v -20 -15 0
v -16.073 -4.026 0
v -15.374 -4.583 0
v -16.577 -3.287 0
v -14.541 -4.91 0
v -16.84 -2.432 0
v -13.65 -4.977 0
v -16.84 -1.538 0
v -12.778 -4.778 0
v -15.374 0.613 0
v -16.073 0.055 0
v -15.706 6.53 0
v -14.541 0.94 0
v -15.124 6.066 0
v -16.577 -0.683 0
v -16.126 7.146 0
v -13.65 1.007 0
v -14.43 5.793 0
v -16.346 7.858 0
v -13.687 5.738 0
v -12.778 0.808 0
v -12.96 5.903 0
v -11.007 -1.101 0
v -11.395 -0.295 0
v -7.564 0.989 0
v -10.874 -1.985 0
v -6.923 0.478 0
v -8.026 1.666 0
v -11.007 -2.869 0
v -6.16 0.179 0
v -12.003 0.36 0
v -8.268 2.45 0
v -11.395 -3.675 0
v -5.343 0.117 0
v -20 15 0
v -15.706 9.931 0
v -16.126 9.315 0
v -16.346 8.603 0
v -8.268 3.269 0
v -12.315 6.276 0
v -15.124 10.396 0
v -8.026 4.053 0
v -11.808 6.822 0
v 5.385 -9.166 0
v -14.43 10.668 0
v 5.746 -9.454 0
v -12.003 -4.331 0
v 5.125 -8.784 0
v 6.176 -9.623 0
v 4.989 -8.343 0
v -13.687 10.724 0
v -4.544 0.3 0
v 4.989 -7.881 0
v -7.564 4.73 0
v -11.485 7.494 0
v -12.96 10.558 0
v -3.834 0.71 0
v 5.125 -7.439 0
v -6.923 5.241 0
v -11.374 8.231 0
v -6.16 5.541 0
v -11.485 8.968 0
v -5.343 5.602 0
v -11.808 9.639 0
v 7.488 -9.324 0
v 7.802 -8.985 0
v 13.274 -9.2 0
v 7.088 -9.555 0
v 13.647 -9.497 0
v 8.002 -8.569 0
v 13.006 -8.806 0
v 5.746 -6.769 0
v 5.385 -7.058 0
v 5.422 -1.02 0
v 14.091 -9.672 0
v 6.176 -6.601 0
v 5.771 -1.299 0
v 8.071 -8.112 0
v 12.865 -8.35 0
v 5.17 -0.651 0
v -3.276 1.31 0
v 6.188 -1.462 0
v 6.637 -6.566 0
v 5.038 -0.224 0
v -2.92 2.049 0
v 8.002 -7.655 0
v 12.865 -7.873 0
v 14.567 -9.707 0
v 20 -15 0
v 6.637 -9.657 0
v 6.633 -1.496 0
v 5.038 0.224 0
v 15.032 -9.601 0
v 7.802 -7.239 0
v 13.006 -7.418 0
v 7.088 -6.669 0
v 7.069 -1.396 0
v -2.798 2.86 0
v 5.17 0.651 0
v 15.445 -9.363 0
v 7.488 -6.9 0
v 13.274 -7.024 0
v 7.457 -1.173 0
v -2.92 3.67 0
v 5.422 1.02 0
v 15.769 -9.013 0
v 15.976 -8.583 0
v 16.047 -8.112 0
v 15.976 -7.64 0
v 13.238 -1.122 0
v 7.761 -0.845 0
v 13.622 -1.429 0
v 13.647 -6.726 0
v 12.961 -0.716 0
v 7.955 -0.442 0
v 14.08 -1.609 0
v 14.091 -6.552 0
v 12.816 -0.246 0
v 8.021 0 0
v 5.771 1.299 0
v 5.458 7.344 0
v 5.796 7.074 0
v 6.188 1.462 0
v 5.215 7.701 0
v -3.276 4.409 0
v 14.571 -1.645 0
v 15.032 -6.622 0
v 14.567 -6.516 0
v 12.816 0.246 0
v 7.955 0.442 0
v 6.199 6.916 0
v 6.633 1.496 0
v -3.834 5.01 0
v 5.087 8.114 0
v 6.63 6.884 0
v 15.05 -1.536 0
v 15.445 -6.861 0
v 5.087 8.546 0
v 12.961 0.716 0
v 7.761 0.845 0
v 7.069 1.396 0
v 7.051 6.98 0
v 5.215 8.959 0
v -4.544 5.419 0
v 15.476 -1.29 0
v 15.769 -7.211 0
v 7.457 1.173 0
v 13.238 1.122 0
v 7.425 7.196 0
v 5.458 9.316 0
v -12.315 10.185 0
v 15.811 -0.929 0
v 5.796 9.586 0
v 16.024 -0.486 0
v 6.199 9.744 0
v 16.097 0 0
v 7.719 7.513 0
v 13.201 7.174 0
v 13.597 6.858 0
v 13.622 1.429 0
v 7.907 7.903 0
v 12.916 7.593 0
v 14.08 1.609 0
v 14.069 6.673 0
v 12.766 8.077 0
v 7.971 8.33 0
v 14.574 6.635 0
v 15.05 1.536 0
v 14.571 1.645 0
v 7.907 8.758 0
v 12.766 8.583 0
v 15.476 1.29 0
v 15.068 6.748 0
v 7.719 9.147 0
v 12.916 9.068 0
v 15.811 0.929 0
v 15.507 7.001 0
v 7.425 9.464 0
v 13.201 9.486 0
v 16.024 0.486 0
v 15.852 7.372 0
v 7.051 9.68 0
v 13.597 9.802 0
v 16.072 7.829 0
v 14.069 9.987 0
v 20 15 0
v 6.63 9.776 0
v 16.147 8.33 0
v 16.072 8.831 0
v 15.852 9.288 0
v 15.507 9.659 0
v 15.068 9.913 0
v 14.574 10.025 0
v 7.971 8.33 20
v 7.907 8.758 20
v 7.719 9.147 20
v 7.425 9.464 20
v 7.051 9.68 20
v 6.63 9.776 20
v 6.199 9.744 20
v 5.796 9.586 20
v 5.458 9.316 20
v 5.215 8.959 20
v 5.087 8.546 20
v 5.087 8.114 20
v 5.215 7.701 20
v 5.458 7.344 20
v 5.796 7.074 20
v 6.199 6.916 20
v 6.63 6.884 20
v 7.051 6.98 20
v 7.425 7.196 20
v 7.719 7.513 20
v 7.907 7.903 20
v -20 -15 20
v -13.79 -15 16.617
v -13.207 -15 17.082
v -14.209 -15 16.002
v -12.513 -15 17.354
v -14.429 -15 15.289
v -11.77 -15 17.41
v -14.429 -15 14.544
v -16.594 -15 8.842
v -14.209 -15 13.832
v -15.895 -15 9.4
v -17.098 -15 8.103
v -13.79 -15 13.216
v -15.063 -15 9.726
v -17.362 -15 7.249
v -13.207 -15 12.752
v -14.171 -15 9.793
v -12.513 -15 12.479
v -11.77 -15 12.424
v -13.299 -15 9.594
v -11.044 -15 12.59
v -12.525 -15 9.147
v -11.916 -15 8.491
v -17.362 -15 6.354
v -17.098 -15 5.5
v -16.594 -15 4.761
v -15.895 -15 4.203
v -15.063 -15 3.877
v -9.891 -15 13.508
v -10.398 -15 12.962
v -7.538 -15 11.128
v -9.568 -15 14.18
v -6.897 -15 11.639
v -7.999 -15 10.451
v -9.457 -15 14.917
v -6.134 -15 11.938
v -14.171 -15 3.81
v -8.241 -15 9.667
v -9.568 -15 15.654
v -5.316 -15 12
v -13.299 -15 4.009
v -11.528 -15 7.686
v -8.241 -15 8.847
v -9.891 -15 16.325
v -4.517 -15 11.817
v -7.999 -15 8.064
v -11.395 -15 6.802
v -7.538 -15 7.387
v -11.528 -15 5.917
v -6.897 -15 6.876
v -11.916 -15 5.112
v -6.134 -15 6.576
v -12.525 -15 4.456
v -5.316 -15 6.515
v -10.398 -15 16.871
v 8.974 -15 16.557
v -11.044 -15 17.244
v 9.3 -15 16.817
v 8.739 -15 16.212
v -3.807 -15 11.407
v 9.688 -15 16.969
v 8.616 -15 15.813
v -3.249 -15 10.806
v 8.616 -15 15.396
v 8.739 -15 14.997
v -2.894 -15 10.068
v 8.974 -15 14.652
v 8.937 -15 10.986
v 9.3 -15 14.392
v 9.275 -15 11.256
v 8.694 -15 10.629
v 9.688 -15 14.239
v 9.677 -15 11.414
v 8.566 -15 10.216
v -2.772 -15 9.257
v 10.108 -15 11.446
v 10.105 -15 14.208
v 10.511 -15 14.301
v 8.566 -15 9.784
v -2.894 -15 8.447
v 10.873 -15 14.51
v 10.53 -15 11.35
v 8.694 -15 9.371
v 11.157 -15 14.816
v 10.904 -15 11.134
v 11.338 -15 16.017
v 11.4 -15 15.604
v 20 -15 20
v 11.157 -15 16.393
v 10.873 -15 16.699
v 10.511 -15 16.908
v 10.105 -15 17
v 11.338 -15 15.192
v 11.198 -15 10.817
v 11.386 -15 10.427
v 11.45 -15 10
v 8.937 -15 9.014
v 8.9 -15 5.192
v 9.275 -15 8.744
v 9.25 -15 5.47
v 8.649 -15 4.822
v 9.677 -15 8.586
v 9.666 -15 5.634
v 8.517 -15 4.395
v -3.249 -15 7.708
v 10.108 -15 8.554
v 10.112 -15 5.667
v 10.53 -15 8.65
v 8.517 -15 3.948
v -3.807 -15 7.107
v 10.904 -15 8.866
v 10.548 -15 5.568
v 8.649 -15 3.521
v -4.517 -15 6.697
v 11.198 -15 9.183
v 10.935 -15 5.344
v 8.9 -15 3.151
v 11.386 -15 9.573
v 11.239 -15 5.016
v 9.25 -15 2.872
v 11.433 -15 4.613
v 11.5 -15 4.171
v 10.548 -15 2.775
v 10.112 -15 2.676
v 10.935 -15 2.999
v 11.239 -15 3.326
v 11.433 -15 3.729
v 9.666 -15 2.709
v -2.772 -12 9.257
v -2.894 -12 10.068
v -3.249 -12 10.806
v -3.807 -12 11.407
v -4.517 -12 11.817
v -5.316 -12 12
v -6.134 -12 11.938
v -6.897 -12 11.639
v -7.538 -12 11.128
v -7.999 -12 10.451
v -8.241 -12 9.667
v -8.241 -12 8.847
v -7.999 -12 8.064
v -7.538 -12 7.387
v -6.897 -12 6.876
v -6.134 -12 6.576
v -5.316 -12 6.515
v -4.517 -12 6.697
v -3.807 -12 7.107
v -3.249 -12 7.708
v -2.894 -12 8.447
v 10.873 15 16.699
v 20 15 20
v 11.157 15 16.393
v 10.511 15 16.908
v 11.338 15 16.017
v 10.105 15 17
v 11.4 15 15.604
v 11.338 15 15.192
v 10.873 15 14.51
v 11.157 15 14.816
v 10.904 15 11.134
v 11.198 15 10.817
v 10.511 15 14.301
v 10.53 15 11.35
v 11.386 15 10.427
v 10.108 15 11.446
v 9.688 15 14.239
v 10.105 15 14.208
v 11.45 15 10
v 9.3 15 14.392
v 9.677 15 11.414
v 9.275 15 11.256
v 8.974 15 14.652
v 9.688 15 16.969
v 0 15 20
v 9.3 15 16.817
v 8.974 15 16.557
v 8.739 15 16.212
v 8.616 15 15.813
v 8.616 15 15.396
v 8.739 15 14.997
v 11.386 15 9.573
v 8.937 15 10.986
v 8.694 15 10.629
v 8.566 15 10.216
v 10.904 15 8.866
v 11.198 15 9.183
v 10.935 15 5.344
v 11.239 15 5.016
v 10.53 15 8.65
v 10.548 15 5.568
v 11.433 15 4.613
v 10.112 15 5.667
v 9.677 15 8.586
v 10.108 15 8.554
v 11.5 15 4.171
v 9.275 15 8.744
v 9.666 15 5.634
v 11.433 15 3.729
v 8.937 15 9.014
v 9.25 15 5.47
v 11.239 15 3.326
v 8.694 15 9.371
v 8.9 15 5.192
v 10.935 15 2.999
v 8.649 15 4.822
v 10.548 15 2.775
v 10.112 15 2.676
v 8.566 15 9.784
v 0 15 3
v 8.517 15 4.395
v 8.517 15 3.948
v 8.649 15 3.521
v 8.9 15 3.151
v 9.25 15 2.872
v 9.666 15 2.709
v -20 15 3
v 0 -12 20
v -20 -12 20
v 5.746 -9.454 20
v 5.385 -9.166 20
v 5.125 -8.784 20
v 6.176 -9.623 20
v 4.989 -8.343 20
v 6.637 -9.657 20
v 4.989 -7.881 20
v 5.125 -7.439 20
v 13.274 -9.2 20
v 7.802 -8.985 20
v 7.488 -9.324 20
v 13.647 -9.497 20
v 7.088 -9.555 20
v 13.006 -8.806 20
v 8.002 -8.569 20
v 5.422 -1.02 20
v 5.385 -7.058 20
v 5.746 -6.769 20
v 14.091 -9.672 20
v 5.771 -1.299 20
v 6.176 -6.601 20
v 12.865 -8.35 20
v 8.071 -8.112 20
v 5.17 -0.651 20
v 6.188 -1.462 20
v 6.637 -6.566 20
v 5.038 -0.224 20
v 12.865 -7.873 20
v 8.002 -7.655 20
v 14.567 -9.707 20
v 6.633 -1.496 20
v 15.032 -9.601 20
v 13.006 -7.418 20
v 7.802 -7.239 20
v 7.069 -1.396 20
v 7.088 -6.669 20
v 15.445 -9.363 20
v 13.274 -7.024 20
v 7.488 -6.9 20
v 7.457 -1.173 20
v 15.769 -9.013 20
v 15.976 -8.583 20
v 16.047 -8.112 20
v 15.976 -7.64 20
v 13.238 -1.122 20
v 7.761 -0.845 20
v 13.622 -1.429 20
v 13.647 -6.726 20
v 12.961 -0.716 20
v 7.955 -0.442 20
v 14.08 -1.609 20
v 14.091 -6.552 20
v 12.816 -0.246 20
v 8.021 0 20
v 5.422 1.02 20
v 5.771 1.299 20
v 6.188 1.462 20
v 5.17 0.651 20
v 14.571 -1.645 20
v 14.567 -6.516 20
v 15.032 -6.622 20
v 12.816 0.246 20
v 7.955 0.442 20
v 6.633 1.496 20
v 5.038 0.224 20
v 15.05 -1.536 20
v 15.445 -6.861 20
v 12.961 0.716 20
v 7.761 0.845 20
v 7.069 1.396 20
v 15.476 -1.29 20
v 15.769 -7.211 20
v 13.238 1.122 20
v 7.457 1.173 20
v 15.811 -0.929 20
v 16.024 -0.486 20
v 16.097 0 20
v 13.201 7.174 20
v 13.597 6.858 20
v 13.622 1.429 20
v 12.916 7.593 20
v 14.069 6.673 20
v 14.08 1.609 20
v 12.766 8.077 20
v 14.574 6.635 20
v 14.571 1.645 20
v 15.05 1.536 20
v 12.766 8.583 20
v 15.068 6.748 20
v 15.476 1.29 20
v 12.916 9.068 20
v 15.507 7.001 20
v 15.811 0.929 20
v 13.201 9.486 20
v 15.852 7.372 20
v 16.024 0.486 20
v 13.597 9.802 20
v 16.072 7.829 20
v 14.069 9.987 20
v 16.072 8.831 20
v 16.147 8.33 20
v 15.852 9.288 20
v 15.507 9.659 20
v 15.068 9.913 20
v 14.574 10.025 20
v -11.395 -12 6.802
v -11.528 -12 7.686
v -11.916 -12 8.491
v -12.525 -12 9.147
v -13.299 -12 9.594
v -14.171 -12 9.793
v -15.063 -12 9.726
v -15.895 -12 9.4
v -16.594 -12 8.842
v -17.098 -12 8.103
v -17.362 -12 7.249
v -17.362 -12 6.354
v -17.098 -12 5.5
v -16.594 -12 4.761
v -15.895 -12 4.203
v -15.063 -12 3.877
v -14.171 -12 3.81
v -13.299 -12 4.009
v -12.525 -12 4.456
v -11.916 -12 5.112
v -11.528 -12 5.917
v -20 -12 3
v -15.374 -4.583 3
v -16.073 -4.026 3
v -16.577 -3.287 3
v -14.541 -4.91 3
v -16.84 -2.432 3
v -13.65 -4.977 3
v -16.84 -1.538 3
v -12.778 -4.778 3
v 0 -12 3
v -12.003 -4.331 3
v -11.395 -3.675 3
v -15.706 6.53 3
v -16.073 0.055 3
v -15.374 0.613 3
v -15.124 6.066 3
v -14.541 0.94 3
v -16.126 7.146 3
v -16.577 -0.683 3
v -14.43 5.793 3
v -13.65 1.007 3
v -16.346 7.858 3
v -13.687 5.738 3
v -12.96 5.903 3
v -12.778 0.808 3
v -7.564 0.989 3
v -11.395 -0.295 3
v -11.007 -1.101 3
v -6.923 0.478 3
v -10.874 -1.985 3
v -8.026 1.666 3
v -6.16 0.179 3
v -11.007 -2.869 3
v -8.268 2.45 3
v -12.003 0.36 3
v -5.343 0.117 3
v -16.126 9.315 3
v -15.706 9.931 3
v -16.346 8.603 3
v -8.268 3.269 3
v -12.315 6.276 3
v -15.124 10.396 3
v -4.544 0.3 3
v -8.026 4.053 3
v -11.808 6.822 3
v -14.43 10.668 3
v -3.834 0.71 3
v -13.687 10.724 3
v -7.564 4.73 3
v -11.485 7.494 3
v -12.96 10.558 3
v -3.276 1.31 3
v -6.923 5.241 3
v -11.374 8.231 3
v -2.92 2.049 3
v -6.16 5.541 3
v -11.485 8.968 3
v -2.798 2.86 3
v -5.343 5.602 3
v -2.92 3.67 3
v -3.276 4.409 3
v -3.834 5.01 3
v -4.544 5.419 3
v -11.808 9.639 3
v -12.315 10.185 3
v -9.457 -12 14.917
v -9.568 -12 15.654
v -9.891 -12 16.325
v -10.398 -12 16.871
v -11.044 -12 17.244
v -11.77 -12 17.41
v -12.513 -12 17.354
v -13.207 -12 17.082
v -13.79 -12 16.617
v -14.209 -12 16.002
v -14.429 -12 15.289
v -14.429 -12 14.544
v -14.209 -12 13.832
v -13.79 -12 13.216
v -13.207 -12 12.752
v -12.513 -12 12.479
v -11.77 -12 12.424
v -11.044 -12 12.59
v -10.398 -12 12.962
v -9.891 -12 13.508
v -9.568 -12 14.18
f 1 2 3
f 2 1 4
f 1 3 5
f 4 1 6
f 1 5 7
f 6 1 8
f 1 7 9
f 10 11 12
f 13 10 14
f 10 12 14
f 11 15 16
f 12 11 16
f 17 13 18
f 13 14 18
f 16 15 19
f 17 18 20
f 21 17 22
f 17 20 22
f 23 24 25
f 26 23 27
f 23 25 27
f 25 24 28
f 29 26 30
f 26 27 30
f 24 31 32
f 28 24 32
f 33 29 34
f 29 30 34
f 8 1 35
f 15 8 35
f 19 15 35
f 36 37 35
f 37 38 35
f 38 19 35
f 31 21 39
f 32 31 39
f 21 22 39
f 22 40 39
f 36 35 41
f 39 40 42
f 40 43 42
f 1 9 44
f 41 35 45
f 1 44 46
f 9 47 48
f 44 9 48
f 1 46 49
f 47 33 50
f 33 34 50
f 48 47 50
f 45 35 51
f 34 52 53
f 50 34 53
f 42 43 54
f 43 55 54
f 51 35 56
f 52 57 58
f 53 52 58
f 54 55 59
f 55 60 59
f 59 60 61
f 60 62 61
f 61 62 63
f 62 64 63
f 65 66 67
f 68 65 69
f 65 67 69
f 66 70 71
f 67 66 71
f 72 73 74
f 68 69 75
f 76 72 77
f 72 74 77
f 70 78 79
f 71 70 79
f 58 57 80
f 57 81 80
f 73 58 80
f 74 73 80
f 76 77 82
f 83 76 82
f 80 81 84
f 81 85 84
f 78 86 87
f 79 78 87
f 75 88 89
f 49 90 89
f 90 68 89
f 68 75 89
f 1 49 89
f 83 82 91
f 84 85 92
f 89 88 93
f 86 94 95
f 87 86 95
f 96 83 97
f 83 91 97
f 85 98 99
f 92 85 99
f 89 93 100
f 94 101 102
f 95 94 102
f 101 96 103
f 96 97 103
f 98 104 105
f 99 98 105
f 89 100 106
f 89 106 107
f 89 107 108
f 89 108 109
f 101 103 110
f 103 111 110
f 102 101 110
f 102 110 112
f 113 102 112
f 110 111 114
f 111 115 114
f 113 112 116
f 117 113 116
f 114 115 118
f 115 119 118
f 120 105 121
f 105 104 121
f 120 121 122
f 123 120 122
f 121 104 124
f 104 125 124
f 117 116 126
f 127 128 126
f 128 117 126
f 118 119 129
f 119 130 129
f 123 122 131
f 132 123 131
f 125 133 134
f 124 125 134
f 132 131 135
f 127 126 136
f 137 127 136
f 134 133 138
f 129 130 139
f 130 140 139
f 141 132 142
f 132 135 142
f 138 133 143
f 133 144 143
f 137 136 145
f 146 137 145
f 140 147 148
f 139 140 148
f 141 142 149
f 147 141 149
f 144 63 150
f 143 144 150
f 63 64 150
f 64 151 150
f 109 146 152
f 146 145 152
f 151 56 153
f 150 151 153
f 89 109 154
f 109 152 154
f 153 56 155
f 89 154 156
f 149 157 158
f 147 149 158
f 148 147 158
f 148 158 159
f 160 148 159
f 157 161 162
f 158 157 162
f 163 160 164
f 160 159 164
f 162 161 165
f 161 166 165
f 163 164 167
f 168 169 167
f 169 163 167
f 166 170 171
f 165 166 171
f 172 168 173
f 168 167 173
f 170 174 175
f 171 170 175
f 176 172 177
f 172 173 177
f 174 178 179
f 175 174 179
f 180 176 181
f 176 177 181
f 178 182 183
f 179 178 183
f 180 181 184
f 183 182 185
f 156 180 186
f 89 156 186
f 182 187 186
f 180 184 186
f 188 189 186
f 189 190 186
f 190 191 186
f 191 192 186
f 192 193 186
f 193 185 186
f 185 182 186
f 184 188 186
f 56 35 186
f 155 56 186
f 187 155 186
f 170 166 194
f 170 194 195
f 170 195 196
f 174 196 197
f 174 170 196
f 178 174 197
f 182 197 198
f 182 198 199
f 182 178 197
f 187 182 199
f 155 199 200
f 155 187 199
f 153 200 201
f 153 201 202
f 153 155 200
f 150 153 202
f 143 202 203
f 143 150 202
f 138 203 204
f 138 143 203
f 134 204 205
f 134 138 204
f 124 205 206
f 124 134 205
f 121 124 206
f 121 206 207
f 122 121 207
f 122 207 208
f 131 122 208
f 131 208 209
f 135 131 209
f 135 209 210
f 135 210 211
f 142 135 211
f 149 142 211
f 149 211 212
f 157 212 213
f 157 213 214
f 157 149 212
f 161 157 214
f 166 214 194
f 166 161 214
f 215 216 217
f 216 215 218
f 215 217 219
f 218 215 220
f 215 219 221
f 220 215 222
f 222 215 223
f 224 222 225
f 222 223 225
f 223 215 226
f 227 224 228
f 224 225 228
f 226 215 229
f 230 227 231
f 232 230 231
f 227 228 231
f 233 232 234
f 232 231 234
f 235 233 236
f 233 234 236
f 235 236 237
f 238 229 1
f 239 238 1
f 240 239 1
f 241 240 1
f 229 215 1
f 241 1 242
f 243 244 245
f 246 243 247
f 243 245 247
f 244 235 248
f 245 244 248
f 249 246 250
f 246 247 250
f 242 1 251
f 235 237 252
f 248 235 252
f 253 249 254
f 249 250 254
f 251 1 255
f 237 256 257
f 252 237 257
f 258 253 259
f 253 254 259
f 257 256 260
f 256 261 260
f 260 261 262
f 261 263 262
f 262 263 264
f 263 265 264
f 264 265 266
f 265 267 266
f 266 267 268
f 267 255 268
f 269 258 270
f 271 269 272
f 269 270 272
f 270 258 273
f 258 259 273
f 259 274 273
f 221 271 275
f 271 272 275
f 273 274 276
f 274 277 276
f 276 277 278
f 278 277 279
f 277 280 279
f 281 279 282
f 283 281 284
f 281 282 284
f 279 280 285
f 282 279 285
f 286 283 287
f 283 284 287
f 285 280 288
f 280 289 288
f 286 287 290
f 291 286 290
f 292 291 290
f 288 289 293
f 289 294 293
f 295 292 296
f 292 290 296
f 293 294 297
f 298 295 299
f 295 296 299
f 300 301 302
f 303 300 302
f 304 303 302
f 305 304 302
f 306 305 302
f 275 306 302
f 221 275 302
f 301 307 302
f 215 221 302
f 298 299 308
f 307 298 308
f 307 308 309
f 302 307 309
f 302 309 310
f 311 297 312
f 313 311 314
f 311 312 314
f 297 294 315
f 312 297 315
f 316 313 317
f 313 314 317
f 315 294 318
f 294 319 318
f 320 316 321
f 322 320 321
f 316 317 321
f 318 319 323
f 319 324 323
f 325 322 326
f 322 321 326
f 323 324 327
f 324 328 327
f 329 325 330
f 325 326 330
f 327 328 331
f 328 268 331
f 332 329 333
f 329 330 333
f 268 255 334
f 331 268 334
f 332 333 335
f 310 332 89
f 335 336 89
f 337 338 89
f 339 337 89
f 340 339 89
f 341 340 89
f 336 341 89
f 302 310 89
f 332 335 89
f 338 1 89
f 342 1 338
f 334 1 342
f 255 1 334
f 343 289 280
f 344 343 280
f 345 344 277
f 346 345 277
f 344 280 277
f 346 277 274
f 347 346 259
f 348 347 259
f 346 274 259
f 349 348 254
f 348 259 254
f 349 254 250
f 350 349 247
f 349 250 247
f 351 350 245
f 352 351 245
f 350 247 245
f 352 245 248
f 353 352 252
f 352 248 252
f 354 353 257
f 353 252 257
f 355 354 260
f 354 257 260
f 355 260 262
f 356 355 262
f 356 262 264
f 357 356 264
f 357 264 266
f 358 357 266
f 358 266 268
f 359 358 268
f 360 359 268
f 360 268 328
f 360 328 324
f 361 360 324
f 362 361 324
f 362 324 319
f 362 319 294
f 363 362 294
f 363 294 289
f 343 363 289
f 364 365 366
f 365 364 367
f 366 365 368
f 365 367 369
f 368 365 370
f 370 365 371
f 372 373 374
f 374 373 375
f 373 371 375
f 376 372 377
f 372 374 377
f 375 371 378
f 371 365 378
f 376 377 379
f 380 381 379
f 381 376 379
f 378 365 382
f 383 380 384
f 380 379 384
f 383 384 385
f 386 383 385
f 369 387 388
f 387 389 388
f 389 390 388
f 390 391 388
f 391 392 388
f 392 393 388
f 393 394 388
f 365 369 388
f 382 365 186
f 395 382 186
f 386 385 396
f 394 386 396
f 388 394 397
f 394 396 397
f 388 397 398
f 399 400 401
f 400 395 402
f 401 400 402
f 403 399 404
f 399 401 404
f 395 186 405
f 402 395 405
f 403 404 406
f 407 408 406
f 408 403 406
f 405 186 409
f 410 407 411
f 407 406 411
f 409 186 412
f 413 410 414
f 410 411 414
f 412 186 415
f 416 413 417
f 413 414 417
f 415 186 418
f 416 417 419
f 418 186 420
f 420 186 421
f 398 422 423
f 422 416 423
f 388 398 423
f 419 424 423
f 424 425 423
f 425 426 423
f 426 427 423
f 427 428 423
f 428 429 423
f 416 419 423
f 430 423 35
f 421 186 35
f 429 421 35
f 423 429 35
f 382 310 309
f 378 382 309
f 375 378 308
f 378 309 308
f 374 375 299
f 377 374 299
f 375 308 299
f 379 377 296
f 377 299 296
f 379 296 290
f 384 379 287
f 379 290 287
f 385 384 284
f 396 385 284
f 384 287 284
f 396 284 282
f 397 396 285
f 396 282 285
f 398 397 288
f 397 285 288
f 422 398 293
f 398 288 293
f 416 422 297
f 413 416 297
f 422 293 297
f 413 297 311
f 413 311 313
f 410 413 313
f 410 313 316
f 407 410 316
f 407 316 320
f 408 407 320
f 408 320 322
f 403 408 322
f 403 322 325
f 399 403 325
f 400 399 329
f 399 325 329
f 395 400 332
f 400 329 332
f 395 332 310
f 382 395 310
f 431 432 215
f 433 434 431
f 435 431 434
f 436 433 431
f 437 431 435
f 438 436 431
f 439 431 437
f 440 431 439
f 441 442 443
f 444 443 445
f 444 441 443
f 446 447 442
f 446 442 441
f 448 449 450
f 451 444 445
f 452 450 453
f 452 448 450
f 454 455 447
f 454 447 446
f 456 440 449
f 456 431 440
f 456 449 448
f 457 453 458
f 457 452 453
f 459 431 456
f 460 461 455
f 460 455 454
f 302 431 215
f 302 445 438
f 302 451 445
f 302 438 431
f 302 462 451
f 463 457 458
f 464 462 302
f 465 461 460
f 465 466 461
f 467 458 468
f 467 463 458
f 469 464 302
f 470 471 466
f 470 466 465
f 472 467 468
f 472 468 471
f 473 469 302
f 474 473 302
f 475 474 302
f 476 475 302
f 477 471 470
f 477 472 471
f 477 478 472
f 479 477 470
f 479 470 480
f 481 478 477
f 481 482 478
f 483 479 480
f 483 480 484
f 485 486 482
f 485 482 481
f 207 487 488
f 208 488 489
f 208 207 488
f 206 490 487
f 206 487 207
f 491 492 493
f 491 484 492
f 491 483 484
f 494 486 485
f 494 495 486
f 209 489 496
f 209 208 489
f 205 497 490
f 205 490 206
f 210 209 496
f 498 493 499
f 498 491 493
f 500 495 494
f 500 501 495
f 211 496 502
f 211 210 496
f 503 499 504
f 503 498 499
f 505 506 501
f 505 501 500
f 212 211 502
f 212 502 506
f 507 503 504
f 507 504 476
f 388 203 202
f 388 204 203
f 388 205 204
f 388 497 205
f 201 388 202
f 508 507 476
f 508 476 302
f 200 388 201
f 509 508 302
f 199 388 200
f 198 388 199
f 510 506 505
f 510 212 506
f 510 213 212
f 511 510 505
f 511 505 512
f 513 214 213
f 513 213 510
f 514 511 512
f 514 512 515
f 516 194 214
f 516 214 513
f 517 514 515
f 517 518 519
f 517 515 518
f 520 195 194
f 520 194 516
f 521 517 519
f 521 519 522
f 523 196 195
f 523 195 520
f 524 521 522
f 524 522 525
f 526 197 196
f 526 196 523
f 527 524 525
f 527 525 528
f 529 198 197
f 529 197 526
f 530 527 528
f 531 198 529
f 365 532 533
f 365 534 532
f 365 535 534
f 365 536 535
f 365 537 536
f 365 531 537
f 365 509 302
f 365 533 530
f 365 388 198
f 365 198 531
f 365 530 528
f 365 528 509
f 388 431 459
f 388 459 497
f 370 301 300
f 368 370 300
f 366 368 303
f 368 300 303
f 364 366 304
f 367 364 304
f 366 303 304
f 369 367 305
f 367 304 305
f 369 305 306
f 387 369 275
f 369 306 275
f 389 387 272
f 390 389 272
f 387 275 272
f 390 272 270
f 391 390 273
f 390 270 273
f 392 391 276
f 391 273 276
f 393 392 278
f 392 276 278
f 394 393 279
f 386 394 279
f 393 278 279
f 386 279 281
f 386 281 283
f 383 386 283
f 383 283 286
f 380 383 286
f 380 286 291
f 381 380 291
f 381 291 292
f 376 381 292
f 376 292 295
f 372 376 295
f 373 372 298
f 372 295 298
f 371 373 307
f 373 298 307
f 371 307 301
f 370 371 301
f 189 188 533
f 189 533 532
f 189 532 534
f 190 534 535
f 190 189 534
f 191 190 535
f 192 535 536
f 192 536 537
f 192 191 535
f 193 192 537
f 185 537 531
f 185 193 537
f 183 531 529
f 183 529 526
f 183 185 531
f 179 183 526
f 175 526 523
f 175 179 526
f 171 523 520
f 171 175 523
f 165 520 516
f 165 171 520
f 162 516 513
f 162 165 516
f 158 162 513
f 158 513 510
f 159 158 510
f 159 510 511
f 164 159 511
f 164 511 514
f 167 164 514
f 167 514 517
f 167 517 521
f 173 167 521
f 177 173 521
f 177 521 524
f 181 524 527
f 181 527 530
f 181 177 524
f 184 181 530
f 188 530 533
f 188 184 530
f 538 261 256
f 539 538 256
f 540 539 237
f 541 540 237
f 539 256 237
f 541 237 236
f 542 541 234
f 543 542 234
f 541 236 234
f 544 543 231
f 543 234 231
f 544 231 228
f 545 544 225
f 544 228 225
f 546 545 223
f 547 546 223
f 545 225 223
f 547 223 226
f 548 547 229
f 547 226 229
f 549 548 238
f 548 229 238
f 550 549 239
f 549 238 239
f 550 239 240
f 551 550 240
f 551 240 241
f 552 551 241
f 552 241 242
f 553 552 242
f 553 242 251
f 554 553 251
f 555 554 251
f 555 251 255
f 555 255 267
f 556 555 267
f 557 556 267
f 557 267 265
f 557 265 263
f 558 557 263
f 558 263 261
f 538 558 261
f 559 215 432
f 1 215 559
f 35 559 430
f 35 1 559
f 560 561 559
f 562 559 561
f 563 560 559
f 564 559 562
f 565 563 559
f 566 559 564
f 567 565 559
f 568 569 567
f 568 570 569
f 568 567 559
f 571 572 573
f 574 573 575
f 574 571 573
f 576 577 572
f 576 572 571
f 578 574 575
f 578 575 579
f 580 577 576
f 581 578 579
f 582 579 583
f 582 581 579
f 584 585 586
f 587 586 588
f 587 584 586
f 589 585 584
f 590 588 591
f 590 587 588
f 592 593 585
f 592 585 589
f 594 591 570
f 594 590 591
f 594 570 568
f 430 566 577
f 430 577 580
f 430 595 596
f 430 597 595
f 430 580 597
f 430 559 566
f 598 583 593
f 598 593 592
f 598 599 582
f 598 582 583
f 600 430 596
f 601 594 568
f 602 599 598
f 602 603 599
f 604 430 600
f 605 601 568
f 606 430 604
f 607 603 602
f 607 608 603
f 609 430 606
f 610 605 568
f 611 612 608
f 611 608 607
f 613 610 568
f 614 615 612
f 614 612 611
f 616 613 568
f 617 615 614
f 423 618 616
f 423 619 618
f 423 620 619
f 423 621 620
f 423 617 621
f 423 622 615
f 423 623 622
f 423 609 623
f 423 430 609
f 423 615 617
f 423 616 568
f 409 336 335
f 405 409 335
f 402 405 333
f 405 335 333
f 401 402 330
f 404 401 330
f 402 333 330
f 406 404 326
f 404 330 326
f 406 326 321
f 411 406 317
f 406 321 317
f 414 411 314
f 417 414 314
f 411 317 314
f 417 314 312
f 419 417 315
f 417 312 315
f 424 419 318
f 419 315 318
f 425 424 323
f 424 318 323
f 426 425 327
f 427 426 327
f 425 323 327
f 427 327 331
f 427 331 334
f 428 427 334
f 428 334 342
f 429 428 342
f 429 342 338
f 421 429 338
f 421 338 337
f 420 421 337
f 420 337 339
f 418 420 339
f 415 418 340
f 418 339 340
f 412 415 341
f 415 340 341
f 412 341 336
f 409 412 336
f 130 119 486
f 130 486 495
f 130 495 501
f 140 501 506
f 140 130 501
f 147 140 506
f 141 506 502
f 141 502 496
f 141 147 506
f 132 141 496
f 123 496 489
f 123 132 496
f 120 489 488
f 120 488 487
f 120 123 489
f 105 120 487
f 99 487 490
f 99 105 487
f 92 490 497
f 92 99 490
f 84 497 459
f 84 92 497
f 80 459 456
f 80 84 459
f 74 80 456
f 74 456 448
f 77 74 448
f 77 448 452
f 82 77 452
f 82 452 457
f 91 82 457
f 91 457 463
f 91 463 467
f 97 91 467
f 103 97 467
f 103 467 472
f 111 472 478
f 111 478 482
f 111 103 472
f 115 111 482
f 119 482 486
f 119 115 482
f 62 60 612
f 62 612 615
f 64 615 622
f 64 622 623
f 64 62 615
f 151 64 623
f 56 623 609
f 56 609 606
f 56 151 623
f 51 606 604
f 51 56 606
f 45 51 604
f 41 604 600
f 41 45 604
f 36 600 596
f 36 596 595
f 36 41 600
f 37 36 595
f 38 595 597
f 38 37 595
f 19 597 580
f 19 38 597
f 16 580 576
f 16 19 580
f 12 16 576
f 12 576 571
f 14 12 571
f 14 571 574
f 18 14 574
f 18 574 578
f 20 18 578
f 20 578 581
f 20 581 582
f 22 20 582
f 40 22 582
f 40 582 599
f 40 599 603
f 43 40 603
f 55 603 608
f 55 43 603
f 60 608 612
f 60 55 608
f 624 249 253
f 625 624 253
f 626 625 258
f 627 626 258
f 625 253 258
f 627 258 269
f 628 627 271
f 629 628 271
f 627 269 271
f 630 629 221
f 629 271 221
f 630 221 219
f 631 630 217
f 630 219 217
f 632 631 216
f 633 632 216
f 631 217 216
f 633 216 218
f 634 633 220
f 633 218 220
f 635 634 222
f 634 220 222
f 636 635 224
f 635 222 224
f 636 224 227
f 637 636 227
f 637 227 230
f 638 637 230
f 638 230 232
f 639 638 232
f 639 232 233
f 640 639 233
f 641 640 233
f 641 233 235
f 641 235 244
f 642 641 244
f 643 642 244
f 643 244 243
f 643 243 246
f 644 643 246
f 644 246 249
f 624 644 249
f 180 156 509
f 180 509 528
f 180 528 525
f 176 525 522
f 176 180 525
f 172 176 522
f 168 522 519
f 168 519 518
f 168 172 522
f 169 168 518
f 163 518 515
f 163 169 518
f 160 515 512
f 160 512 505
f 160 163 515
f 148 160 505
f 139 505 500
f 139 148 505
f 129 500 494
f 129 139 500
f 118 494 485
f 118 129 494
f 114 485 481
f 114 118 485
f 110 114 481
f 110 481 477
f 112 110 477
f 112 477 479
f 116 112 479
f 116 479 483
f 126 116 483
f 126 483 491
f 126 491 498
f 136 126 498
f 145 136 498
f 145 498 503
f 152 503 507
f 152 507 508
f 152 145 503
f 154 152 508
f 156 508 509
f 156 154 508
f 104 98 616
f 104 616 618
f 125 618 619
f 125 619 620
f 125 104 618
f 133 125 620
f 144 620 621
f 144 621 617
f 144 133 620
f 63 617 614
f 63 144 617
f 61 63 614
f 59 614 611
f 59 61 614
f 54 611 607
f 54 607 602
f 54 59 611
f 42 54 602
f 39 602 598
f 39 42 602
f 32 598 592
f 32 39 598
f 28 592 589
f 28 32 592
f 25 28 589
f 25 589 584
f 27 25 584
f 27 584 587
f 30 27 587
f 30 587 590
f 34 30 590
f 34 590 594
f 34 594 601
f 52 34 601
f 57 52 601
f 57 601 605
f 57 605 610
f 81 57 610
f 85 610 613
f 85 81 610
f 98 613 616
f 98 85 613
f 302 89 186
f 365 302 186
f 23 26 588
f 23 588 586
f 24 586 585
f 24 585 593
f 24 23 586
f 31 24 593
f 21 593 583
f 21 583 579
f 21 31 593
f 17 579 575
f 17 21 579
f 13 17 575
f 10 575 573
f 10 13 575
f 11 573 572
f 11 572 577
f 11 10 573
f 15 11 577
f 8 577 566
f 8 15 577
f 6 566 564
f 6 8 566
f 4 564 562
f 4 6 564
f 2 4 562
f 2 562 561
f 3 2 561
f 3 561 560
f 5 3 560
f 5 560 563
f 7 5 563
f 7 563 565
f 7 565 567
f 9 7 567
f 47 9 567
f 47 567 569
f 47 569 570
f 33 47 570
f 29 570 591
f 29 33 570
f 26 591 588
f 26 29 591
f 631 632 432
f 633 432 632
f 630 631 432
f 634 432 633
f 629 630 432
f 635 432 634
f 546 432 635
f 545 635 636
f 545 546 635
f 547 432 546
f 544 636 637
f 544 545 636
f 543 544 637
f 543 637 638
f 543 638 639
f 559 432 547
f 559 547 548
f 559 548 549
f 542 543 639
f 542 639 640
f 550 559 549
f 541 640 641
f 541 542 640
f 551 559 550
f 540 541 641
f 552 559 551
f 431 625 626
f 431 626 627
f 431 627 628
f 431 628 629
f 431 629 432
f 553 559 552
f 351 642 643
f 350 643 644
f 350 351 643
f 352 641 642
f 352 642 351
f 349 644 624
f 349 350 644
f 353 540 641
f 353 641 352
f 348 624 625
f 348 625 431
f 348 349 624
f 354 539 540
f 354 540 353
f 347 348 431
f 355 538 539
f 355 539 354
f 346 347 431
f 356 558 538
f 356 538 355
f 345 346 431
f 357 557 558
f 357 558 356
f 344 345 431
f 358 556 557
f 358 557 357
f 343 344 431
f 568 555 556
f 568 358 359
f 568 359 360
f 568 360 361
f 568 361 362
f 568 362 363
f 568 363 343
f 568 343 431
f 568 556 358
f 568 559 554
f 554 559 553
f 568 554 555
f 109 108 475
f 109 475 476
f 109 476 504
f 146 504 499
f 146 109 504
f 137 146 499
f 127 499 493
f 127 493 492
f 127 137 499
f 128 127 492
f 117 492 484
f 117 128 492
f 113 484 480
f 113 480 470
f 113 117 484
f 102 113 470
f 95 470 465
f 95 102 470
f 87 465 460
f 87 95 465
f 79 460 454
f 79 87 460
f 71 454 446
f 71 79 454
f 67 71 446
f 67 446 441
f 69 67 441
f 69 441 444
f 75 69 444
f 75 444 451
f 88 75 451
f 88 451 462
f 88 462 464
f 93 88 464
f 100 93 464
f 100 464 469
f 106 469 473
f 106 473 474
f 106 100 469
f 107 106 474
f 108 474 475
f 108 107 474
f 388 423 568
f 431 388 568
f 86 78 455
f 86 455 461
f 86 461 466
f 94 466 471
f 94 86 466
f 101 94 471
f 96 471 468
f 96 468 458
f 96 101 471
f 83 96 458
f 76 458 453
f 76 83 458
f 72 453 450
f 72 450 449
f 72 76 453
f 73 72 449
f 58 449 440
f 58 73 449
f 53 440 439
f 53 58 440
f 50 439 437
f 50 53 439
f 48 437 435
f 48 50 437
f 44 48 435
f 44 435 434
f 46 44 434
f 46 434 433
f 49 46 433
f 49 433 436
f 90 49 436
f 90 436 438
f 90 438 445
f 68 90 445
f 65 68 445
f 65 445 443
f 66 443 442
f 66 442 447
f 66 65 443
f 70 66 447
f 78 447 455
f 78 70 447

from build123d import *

# Parameters (mm, degrees)
F0_W     = 20
F0_H     = 27
F0_R     = 3
F0_R_2   = 2.75
F0_R_3   = 2.5
F1_DEPTH = 3
F0_R_4   = 1.55
F0_R_5   = 1.6
F0_R_6   = 1.5
F0_R_7   = 1.65
F0_R_8   = 1.45
F0_R_9   = 1.7
F2_DEPTH = 20
F0_H_2   = 3
F3_DEPTH = 20
F4_R     = 1.4
F4_R_2   = 1.45
F4_R_3   = 1.5
F4_R_4   = 2.75
F4_R_5   = 2.5
F4_R_6   = 3
F5_DEPTH = 30


with BuildPart() as f1:
    # F0 (on Top) → F1 (new body)
    with BuildSketch(Plane.XY):
        with Locations((-10, 1.5)):
            Rectangle(F0_W, F0_H)
        with Locations((-13.873821, -1.985078)):
            Circle(F0_R, mode=Mode.SUBTRACT)
        with Locations((-5.548216, 2.859571)):
            Circle(F0_R_2, mode=Mode.SUBTRACT)
        with Locations((-13.873821, 8.230659)):
            Circle(F0_R_3, mode=Mode.SUBTRACT)
    extrude(amount=F1_DEPTH)

    # F0 (on Top) → F2 (join)
    with BuildSketch(Plane.XY):
        Polygon((0, -15), (20, -15), (20, 15), (0, 15), (0, -12), align=None)
        with Locations((6.521292, -8.111834)):
            Circle(F0_R_4, mode=Mode.SUBTRACT)
        with Locations((14.447207, -8.111834)):
            Circle(F0_R_5, mode=Mode.SUBTRACT)
        with Locations((6.521292, 0)):
            Circle(F0_R_6, mode=Mode.SUBTRACT)
        with Locations((14.447207, 0)):
            Circle(F0_R_7, mode=Mode.SUBTRACT)
        with Locations((6.521292, 8.330117)):
            Circle(F0_R_8, mode=Mode.SUBTRACT)
        with Locations((14.447207, 8.330117)):
            Circle(F0_R_9, mode=Mode.SUBTRACT)
    extrude(amount=F2_DEPTH)

    # F0 (on Top) → F3 (join, through all)
    with BuildSketch(Plane.XY):
        with Locations((-10, -13.5)):
            Rectangle(F0_W, F0_H_2)
    extrude(amount=F3_DEPTH)

    # F4 (on face) → F5 (cut, through all)
    with BuildSketch(Plane.XZ.offset(15)):
        with Locations((10, 15.604385)):
            Circle(F4_R)
        with Locations((10, 10)):
            Circle(F4_R_2)
        with Locations((10, 4.171362)):
            Circle(F4_R_3)
        with Locations((-5.521618, 9.25734)):
            Circle(F4_R_4)
        with Locations((-11.956942, 14.9168)):
            Circle(F4_R_5)
        with Locations((-14.395144, 6.801534)):
            Circle(F4_R_6)
    extrude(amount=-F5_DEPTH, mode=Mode.SUBTRACT)


solid = f1.part
